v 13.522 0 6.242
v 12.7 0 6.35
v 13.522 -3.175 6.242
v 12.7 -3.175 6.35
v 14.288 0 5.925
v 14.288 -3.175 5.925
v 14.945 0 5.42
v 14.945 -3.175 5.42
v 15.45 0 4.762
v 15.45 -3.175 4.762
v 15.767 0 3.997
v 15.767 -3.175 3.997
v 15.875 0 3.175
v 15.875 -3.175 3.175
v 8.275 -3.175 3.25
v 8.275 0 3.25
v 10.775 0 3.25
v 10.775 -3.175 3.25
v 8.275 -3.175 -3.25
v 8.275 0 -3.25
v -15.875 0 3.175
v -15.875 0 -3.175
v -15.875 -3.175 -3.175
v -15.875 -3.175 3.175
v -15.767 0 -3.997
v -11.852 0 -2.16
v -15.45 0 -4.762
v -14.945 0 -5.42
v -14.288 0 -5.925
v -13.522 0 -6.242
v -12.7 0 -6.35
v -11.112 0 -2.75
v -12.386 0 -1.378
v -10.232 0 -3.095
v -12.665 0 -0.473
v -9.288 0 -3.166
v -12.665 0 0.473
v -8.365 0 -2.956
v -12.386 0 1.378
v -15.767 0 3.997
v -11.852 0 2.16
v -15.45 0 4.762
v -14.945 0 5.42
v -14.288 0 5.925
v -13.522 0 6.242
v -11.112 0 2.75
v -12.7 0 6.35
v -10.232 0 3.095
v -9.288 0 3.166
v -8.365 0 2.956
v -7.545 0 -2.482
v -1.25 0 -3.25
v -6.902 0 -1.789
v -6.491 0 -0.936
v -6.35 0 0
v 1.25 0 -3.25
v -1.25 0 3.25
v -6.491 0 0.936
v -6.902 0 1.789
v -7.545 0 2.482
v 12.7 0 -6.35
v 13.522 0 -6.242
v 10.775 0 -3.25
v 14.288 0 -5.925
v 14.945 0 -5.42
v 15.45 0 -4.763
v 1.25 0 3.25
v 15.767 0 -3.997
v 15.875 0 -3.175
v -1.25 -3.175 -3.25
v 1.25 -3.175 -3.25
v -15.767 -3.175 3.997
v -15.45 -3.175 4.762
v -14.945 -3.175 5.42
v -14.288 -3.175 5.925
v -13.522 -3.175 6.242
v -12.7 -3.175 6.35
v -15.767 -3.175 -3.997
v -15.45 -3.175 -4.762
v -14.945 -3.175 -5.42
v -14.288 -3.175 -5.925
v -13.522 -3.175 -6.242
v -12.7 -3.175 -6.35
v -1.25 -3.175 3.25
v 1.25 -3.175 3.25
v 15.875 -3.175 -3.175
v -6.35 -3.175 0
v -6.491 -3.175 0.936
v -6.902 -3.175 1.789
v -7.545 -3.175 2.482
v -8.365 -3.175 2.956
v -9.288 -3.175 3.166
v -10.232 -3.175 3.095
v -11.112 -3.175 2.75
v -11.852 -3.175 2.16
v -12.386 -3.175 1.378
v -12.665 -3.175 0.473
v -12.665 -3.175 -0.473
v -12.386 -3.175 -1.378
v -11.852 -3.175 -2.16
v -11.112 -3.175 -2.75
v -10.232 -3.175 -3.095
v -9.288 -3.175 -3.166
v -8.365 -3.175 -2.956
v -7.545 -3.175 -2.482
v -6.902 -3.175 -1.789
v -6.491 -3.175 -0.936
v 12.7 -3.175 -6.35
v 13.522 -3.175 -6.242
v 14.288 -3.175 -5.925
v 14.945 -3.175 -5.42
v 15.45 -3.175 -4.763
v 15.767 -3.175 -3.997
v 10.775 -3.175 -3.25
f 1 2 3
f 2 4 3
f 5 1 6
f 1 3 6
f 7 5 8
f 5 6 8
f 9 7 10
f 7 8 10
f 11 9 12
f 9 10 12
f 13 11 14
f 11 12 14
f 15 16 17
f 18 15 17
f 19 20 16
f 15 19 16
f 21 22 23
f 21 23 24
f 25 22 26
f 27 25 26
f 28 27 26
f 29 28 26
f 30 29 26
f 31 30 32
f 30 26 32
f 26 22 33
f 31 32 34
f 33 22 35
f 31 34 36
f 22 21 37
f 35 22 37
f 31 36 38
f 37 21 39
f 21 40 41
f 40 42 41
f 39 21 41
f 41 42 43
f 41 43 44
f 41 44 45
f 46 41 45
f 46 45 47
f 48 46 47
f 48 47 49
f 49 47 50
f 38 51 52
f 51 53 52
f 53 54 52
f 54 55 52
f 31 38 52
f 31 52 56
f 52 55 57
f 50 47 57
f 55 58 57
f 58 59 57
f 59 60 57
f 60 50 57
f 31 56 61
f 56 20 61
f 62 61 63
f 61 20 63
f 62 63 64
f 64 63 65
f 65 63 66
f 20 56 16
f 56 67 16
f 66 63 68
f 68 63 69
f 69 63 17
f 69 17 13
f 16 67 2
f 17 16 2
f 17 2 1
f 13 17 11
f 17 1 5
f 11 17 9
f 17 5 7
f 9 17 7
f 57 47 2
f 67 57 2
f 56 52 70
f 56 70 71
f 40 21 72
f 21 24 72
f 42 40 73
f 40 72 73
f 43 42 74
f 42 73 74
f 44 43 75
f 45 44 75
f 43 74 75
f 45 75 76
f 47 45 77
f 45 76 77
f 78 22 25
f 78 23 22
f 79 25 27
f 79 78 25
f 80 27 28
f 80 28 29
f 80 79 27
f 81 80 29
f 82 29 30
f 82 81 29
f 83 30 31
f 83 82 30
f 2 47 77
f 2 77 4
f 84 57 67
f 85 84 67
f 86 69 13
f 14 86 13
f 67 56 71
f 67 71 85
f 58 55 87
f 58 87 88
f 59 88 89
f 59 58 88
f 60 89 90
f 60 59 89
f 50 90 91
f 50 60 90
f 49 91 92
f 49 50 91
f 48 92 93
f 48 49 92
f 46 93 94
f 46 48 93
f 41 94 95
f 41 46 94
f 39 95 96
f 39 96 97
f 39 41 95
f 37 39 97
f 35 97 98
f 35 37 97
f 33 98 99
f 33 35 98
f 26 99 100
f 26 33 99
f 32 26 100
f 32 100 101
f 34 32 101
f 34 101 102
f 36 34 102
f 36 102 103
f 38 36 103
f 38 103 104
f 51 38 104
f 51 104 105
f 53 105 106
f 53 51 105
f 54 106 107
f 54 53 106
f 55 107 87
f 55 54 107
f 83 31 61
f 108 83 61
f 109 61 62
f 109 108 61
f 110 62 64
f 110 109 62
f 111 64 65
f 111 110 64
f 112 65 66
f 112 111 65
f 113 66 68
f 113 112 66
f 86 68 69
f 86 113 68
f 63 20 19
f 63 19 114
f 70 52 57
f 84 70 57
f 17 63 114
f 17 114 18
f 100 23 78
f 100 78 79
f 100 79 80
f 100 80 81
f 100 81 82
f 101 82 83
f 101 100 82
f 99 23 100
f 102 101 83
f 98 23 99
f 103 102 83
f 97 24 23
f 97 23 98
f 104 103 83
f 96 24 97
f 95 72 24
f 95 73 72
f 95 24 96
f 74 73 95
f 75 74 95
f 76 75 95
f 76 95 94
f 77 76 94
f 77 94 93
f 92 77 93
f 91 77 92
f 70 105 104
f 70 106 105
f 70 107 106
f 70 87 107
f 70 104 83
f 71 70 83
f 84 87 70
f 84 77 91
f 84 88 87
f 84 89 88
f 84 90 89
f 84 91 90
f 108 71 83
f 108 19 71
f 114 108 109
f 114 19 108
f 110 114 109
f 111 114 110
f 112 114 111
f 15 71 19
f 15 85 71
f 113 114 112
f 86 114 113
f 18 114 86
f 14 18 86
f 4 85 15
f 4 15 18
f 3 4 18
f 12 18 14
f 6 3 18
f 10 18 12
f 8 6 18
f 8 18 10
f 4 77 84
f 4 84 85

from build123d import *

# Parameters (mm, degrees)
F0_W     = 31.75
F0_H     = 12.7
F0_R     = 3.175
F0_W_2   = 2.5
F0_H_2   = 6.5
F1_DEPTH = 3.175
F2_R     = 3.175


with BuildPart() as f1:
    # F0 (on Front) → F1 (new body)
    with BuildSketch(Plane.XZ):
        Rectangle(F0_W, F0_H)
        with Locations((-9.525, 0)):
            Circle(F0_R, mode=Mode.SUBTRACT)
        Rectangle(F0_W_2, F0_H_2, mode=Mode.SUBTRACT)
        with Locations((9.525, 0)):
            Rectangle(F0_W_2, F0_H_2, mode=Mode.SUBTRACT)
    extrude(amount=F1_DEPTH)

    # F2
    f2_edges = [f1.edges().sort_by_distance(p)[0] for p in [
        (15.875, -1.5875, -6.35),
        (15.875, -1.5875, 6.35),
        (-15.875, -1.5875, -6.35),
        (-15.875, -1.5875, 6.35),
    ]]
    fillet(f2_edges, radius=F2_R)


solid = f1.part
